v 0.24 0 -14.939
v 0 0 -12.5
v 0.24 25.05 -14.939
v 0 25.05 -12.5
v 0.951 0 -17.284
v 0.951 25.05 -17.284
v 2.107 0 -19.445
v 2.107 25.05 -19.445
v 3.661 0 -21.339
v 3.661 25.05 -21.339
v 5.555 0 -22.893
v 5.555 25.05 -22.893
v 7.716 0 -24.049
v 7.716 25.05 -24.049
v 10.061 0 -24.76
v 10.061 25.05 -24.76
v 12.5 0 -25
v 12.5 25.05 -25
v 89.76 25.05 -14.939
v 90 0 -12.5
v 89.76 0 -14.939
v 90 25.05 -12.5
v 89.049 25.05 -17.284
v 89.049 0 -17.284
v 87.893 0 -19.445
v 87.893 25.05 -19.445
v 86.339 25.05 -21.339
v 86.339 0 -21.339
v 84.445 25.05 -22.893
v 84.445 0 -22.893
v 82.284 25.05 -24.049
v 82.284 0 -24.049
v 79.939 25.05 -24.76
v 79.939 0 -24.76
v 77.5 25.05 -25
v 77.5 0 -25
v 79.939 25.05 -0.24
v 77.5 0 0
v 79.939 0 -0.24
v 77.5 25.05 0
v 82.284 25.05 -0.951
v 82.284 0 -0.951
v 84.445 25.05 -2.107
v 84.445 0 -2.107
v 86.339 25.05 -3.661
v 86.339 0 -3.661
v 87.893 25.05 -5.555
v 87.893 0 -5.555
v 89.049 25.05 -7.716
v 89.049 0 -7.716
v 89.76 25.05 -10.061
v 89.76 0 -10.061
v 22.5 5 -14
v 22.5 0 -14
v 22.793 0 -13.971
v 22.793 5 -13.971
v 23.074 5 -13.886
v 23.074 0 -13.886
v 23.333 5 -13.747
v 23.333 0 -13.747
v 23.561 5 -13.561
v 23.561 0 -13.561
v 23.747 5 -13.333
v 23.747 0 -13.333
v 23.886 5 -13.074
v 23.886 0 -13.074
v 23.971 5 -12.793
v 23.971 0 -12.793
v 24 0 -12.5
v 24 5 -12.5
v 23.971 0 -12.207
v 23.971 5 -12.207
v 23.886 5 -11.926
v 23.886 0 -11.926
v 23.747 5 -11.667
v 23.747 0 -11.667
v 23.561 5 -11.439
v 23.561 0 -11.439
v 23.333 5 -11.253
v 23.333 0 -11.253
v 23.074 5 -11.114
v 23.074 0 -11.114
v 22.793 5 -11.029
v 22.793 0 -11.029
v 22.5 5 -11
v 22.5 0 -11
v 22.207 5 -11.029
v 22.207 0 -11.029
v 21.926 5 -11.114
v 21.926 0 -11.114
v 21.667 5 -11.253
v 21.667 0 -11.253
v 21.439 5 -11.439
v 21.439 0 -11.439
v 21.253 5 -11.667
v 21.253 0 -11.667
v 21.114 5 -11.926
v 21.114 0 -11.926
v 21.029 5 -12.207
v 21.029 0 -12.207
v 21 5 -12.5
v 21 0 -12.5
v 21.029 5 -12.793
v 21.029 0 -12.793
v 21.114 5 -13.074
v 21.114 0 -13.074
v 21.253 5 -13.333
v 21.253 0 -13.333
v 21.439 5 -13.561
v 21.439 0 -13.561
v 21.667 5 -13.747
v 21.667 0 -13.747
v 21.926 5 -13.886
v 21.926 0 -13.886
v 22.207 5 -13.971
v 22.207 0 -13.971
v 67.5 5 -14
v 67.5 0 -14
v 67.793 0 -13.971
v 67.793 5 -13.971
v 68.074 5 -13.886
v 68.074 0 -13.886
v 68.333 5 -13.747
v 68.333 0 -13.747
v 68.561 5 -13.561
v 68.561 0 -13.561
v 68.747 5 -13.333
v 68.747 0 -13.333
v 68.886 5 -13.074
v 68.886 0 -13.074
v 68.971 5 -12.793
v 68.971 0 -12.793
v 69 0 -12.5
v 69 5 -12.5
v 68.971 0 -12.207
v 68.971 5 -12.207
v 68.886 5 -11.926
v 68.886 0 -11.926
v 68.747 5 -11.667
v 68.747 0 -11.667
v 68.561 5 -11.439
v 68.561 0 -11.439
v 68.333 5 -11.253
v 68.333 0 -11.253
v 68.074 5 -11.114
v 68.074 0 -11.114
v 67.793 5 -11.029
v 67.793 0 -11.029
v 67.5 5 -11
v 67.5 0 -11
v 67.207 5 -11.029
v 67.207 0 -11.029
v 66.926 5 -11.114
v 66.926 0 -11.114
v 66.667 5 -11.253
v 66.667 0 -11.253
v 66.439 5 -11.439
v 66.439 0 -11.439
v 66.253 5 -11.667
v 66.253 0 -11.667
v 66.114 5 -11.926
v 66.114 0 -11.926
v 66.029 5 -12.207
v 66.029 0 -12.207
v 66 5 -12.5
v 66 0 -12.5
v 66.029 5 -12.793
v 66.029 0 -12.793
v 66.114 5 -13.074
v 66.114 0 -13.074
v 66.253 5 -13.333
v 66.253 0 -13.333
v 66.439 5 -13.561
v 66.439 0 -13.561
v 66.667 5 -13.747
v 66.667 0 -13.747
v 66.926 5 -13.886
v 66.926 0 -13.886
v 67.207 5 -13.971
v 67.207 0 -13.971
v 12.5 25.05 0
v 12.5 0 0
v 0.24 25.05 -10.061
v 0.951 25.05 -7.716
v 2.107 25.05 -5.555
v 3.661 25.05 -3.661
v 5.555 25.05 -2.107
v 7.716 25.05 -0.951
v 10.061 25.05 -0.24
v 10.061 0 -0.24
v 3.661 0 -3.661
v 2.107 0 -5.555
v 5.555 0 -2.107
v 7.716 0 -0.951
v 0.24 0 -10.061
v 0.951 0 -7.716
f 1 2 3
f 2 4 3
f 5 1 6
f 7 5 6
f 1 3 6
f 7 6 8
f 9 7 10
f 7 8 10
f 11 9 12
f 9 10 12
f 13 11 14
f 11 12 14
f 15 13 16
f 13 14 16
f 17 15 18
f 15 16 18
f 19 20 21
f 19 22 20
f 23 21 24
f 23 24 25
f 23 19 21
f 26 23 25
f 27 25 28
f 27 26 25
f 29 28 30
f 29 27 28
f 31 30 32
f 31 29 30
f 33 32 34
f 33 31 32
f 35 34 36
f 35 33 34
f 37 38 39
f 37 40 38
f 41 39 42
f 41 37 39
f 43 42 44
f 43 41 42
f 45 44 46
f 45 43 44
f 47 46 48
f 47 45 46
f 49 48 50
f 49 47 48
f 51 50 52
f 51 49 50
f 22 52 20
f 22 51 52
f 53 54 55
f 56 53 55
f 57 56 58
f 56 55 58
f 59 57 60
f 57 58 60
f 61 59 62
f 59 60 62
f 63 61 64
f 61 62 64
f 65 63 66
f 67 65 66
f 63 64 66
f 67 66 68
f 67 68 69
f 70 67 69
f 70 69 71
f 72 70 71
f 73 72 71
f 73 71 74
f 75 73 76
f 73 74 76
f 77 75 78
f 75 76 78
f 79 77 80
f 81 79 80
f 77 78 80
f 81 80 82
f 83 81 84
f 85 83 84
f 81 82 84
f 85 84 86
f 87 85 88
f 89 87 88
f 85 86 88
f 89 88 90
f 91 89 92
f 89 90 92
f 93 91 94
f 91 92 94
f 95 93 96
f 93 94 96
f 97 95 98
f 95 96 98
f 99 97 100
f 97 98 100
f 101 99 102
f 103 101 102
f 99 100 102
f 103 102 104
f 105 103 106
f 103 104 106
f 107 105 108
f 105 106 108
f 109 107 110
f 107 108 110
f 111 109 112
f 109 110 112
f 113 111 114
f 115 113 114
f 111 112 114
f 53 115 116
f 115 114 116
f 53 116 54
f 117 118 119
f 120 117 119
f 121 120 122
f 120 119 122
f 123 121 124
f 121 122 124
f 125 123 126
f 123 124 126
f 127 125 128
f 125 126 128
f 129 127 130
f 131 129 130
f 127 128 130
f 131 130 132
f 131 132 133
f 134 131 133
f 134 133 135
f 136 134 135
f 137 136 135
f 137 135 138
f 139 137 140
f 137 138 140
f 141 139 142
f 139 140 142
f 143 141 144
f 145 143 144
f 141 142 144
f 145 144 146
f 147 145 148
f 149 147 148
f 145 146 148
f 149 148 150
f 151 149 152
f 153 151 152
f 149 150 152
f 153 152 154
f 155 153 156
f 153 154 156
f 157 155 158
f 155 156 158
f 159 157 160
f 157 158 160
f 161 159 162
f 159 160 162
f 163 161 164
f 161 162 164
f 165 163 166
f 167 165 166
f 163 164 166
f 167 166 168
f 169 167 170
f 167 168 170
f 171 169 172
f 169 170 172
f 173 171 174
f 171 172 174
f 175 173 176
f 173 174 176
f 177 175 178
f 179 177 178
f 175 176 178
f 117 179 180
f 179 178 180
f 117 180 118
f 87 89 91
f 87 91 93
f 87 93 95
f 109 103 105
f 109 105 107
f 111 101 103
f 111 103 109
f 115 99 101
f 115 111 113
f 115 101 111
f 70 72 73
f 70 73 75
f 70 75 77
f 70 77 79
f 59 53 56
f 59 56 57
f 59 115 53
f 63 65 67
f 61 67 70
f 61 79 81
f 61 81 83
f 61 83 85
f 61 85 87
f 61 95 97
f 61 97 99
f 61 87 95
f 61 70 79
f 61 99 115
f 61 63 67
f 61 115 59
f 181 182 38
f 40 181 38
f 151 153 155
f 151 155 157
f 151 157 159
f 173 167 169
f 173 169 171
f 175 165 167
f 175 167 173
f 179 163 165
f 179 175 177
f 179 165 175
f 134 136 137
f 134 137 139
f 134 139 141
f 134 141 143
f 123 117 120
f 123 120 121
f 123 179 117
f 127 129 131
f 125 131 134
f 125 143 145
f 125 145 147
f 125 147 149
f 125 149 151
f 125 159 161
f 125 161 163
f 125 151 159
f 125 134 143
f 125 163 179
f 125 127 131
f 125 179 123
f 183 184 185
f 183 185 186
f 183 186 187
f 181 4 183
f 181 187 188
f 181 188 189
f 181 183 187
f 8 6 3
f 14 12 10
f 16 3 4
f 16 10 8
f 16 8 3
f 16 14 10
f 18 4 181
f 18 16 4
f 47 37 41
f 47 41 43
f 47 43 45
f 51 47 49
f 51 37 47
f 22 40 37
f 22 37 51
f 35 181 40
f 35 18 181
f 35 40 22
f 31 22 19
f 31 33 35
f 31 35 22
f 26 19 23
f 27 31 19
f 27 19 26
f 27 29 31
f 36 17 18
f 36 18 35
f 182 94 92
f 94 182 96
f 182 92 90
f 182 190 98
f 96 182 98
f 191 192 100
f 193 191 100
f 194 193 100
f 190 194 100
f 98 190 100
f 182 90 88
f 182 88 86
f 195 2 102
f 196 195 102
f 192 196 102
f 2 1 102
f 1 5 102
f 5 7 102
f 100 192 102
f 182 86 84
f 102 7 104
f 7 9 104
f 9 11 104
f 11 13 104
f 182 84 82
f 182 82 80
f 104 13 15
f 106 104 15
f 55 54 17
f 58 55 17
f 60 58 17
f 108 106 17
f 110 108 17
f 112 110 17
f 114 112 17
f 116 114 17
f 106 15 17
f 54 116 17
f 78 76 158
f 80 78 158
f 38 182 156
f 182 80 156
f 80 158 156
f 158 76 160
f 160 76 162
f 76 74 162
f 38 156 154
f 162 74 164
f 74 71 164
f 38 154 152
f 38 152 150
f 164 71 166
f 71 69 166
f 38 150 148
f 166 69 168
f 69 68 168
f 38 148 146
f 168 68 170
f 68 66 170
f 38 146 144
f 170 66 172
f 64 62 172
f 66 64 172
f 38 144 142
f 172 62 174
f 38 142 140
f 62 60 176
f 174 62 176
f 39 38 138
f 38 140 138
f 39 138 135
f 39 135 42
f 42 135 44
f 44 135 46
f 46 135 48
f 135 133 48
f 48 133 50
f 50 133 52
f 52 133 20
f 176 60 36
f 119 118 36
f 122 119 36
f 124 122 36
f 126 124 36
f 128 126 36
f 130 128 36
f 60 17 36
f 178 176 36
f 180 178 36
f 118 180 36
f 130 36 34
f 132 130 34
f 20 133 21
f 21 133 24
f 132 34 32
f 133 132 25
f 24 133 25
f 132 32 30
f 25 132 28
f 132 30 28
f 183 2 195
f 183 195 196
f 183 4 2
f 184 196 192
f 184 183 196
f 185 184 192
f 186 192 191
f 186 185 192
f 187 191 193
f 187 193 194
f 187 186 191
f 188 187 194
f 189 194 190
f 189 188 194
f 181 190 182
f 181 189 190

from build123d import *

# Parameters (mm, degrees)
SKETCH1_W           = 90
SKETCH1_H           = 25
BOSS_EXTRUDE1_DEPTH = 25.05
FILLET1_R           = 12.5
SKETCH2_R           = 1.5
CUT_EXTRUDE1_DEPTH  = 5


with BuildPart() as part:
    # Sketch1 → Boss-Extrude1 (new body)
    with BuildSketch(Plane(origin=(0, 0, 0), x_dir=(1, 0, 0), z_dir=(0, 1, 0))):
        with Locations((45, 12.5)):
            Rectangle(SKETCH1_W, SKETCH1_H)
    extrude(amount=BOSS_EXTRUDE1_DEPTH)

    # Fillet1
    fillet1_edges = [part.edges().sort_by_distance(p)[0] for p in [
        (90, 12.525, 0),
        (90, 12.525, -25),
        (0, 12.525, 0),
        (0, 12.525, -25),
    ]]
    fillet(fillet1_edges, radius=FILLET1_R - 0.0001)  # a hair under: the kernel refuses the full size

    # Sketch2 → Cut-Extrude1 (cut)
    with BuildSketch(Plane.XZ):
        with Locations(Location((22.5, -12.5, 0), (0, 0, 270))):
            Circle(SKETCH2_R)
        with Locations(Location((67.5, -12.5, 0), (0, 0, 270))):
            Circle(SKETCH2_R)
    extrude(amount=-CUT_EXTRUDE1_DEPTH, mode=Mode.SUBTRACT)


solid = part.part
